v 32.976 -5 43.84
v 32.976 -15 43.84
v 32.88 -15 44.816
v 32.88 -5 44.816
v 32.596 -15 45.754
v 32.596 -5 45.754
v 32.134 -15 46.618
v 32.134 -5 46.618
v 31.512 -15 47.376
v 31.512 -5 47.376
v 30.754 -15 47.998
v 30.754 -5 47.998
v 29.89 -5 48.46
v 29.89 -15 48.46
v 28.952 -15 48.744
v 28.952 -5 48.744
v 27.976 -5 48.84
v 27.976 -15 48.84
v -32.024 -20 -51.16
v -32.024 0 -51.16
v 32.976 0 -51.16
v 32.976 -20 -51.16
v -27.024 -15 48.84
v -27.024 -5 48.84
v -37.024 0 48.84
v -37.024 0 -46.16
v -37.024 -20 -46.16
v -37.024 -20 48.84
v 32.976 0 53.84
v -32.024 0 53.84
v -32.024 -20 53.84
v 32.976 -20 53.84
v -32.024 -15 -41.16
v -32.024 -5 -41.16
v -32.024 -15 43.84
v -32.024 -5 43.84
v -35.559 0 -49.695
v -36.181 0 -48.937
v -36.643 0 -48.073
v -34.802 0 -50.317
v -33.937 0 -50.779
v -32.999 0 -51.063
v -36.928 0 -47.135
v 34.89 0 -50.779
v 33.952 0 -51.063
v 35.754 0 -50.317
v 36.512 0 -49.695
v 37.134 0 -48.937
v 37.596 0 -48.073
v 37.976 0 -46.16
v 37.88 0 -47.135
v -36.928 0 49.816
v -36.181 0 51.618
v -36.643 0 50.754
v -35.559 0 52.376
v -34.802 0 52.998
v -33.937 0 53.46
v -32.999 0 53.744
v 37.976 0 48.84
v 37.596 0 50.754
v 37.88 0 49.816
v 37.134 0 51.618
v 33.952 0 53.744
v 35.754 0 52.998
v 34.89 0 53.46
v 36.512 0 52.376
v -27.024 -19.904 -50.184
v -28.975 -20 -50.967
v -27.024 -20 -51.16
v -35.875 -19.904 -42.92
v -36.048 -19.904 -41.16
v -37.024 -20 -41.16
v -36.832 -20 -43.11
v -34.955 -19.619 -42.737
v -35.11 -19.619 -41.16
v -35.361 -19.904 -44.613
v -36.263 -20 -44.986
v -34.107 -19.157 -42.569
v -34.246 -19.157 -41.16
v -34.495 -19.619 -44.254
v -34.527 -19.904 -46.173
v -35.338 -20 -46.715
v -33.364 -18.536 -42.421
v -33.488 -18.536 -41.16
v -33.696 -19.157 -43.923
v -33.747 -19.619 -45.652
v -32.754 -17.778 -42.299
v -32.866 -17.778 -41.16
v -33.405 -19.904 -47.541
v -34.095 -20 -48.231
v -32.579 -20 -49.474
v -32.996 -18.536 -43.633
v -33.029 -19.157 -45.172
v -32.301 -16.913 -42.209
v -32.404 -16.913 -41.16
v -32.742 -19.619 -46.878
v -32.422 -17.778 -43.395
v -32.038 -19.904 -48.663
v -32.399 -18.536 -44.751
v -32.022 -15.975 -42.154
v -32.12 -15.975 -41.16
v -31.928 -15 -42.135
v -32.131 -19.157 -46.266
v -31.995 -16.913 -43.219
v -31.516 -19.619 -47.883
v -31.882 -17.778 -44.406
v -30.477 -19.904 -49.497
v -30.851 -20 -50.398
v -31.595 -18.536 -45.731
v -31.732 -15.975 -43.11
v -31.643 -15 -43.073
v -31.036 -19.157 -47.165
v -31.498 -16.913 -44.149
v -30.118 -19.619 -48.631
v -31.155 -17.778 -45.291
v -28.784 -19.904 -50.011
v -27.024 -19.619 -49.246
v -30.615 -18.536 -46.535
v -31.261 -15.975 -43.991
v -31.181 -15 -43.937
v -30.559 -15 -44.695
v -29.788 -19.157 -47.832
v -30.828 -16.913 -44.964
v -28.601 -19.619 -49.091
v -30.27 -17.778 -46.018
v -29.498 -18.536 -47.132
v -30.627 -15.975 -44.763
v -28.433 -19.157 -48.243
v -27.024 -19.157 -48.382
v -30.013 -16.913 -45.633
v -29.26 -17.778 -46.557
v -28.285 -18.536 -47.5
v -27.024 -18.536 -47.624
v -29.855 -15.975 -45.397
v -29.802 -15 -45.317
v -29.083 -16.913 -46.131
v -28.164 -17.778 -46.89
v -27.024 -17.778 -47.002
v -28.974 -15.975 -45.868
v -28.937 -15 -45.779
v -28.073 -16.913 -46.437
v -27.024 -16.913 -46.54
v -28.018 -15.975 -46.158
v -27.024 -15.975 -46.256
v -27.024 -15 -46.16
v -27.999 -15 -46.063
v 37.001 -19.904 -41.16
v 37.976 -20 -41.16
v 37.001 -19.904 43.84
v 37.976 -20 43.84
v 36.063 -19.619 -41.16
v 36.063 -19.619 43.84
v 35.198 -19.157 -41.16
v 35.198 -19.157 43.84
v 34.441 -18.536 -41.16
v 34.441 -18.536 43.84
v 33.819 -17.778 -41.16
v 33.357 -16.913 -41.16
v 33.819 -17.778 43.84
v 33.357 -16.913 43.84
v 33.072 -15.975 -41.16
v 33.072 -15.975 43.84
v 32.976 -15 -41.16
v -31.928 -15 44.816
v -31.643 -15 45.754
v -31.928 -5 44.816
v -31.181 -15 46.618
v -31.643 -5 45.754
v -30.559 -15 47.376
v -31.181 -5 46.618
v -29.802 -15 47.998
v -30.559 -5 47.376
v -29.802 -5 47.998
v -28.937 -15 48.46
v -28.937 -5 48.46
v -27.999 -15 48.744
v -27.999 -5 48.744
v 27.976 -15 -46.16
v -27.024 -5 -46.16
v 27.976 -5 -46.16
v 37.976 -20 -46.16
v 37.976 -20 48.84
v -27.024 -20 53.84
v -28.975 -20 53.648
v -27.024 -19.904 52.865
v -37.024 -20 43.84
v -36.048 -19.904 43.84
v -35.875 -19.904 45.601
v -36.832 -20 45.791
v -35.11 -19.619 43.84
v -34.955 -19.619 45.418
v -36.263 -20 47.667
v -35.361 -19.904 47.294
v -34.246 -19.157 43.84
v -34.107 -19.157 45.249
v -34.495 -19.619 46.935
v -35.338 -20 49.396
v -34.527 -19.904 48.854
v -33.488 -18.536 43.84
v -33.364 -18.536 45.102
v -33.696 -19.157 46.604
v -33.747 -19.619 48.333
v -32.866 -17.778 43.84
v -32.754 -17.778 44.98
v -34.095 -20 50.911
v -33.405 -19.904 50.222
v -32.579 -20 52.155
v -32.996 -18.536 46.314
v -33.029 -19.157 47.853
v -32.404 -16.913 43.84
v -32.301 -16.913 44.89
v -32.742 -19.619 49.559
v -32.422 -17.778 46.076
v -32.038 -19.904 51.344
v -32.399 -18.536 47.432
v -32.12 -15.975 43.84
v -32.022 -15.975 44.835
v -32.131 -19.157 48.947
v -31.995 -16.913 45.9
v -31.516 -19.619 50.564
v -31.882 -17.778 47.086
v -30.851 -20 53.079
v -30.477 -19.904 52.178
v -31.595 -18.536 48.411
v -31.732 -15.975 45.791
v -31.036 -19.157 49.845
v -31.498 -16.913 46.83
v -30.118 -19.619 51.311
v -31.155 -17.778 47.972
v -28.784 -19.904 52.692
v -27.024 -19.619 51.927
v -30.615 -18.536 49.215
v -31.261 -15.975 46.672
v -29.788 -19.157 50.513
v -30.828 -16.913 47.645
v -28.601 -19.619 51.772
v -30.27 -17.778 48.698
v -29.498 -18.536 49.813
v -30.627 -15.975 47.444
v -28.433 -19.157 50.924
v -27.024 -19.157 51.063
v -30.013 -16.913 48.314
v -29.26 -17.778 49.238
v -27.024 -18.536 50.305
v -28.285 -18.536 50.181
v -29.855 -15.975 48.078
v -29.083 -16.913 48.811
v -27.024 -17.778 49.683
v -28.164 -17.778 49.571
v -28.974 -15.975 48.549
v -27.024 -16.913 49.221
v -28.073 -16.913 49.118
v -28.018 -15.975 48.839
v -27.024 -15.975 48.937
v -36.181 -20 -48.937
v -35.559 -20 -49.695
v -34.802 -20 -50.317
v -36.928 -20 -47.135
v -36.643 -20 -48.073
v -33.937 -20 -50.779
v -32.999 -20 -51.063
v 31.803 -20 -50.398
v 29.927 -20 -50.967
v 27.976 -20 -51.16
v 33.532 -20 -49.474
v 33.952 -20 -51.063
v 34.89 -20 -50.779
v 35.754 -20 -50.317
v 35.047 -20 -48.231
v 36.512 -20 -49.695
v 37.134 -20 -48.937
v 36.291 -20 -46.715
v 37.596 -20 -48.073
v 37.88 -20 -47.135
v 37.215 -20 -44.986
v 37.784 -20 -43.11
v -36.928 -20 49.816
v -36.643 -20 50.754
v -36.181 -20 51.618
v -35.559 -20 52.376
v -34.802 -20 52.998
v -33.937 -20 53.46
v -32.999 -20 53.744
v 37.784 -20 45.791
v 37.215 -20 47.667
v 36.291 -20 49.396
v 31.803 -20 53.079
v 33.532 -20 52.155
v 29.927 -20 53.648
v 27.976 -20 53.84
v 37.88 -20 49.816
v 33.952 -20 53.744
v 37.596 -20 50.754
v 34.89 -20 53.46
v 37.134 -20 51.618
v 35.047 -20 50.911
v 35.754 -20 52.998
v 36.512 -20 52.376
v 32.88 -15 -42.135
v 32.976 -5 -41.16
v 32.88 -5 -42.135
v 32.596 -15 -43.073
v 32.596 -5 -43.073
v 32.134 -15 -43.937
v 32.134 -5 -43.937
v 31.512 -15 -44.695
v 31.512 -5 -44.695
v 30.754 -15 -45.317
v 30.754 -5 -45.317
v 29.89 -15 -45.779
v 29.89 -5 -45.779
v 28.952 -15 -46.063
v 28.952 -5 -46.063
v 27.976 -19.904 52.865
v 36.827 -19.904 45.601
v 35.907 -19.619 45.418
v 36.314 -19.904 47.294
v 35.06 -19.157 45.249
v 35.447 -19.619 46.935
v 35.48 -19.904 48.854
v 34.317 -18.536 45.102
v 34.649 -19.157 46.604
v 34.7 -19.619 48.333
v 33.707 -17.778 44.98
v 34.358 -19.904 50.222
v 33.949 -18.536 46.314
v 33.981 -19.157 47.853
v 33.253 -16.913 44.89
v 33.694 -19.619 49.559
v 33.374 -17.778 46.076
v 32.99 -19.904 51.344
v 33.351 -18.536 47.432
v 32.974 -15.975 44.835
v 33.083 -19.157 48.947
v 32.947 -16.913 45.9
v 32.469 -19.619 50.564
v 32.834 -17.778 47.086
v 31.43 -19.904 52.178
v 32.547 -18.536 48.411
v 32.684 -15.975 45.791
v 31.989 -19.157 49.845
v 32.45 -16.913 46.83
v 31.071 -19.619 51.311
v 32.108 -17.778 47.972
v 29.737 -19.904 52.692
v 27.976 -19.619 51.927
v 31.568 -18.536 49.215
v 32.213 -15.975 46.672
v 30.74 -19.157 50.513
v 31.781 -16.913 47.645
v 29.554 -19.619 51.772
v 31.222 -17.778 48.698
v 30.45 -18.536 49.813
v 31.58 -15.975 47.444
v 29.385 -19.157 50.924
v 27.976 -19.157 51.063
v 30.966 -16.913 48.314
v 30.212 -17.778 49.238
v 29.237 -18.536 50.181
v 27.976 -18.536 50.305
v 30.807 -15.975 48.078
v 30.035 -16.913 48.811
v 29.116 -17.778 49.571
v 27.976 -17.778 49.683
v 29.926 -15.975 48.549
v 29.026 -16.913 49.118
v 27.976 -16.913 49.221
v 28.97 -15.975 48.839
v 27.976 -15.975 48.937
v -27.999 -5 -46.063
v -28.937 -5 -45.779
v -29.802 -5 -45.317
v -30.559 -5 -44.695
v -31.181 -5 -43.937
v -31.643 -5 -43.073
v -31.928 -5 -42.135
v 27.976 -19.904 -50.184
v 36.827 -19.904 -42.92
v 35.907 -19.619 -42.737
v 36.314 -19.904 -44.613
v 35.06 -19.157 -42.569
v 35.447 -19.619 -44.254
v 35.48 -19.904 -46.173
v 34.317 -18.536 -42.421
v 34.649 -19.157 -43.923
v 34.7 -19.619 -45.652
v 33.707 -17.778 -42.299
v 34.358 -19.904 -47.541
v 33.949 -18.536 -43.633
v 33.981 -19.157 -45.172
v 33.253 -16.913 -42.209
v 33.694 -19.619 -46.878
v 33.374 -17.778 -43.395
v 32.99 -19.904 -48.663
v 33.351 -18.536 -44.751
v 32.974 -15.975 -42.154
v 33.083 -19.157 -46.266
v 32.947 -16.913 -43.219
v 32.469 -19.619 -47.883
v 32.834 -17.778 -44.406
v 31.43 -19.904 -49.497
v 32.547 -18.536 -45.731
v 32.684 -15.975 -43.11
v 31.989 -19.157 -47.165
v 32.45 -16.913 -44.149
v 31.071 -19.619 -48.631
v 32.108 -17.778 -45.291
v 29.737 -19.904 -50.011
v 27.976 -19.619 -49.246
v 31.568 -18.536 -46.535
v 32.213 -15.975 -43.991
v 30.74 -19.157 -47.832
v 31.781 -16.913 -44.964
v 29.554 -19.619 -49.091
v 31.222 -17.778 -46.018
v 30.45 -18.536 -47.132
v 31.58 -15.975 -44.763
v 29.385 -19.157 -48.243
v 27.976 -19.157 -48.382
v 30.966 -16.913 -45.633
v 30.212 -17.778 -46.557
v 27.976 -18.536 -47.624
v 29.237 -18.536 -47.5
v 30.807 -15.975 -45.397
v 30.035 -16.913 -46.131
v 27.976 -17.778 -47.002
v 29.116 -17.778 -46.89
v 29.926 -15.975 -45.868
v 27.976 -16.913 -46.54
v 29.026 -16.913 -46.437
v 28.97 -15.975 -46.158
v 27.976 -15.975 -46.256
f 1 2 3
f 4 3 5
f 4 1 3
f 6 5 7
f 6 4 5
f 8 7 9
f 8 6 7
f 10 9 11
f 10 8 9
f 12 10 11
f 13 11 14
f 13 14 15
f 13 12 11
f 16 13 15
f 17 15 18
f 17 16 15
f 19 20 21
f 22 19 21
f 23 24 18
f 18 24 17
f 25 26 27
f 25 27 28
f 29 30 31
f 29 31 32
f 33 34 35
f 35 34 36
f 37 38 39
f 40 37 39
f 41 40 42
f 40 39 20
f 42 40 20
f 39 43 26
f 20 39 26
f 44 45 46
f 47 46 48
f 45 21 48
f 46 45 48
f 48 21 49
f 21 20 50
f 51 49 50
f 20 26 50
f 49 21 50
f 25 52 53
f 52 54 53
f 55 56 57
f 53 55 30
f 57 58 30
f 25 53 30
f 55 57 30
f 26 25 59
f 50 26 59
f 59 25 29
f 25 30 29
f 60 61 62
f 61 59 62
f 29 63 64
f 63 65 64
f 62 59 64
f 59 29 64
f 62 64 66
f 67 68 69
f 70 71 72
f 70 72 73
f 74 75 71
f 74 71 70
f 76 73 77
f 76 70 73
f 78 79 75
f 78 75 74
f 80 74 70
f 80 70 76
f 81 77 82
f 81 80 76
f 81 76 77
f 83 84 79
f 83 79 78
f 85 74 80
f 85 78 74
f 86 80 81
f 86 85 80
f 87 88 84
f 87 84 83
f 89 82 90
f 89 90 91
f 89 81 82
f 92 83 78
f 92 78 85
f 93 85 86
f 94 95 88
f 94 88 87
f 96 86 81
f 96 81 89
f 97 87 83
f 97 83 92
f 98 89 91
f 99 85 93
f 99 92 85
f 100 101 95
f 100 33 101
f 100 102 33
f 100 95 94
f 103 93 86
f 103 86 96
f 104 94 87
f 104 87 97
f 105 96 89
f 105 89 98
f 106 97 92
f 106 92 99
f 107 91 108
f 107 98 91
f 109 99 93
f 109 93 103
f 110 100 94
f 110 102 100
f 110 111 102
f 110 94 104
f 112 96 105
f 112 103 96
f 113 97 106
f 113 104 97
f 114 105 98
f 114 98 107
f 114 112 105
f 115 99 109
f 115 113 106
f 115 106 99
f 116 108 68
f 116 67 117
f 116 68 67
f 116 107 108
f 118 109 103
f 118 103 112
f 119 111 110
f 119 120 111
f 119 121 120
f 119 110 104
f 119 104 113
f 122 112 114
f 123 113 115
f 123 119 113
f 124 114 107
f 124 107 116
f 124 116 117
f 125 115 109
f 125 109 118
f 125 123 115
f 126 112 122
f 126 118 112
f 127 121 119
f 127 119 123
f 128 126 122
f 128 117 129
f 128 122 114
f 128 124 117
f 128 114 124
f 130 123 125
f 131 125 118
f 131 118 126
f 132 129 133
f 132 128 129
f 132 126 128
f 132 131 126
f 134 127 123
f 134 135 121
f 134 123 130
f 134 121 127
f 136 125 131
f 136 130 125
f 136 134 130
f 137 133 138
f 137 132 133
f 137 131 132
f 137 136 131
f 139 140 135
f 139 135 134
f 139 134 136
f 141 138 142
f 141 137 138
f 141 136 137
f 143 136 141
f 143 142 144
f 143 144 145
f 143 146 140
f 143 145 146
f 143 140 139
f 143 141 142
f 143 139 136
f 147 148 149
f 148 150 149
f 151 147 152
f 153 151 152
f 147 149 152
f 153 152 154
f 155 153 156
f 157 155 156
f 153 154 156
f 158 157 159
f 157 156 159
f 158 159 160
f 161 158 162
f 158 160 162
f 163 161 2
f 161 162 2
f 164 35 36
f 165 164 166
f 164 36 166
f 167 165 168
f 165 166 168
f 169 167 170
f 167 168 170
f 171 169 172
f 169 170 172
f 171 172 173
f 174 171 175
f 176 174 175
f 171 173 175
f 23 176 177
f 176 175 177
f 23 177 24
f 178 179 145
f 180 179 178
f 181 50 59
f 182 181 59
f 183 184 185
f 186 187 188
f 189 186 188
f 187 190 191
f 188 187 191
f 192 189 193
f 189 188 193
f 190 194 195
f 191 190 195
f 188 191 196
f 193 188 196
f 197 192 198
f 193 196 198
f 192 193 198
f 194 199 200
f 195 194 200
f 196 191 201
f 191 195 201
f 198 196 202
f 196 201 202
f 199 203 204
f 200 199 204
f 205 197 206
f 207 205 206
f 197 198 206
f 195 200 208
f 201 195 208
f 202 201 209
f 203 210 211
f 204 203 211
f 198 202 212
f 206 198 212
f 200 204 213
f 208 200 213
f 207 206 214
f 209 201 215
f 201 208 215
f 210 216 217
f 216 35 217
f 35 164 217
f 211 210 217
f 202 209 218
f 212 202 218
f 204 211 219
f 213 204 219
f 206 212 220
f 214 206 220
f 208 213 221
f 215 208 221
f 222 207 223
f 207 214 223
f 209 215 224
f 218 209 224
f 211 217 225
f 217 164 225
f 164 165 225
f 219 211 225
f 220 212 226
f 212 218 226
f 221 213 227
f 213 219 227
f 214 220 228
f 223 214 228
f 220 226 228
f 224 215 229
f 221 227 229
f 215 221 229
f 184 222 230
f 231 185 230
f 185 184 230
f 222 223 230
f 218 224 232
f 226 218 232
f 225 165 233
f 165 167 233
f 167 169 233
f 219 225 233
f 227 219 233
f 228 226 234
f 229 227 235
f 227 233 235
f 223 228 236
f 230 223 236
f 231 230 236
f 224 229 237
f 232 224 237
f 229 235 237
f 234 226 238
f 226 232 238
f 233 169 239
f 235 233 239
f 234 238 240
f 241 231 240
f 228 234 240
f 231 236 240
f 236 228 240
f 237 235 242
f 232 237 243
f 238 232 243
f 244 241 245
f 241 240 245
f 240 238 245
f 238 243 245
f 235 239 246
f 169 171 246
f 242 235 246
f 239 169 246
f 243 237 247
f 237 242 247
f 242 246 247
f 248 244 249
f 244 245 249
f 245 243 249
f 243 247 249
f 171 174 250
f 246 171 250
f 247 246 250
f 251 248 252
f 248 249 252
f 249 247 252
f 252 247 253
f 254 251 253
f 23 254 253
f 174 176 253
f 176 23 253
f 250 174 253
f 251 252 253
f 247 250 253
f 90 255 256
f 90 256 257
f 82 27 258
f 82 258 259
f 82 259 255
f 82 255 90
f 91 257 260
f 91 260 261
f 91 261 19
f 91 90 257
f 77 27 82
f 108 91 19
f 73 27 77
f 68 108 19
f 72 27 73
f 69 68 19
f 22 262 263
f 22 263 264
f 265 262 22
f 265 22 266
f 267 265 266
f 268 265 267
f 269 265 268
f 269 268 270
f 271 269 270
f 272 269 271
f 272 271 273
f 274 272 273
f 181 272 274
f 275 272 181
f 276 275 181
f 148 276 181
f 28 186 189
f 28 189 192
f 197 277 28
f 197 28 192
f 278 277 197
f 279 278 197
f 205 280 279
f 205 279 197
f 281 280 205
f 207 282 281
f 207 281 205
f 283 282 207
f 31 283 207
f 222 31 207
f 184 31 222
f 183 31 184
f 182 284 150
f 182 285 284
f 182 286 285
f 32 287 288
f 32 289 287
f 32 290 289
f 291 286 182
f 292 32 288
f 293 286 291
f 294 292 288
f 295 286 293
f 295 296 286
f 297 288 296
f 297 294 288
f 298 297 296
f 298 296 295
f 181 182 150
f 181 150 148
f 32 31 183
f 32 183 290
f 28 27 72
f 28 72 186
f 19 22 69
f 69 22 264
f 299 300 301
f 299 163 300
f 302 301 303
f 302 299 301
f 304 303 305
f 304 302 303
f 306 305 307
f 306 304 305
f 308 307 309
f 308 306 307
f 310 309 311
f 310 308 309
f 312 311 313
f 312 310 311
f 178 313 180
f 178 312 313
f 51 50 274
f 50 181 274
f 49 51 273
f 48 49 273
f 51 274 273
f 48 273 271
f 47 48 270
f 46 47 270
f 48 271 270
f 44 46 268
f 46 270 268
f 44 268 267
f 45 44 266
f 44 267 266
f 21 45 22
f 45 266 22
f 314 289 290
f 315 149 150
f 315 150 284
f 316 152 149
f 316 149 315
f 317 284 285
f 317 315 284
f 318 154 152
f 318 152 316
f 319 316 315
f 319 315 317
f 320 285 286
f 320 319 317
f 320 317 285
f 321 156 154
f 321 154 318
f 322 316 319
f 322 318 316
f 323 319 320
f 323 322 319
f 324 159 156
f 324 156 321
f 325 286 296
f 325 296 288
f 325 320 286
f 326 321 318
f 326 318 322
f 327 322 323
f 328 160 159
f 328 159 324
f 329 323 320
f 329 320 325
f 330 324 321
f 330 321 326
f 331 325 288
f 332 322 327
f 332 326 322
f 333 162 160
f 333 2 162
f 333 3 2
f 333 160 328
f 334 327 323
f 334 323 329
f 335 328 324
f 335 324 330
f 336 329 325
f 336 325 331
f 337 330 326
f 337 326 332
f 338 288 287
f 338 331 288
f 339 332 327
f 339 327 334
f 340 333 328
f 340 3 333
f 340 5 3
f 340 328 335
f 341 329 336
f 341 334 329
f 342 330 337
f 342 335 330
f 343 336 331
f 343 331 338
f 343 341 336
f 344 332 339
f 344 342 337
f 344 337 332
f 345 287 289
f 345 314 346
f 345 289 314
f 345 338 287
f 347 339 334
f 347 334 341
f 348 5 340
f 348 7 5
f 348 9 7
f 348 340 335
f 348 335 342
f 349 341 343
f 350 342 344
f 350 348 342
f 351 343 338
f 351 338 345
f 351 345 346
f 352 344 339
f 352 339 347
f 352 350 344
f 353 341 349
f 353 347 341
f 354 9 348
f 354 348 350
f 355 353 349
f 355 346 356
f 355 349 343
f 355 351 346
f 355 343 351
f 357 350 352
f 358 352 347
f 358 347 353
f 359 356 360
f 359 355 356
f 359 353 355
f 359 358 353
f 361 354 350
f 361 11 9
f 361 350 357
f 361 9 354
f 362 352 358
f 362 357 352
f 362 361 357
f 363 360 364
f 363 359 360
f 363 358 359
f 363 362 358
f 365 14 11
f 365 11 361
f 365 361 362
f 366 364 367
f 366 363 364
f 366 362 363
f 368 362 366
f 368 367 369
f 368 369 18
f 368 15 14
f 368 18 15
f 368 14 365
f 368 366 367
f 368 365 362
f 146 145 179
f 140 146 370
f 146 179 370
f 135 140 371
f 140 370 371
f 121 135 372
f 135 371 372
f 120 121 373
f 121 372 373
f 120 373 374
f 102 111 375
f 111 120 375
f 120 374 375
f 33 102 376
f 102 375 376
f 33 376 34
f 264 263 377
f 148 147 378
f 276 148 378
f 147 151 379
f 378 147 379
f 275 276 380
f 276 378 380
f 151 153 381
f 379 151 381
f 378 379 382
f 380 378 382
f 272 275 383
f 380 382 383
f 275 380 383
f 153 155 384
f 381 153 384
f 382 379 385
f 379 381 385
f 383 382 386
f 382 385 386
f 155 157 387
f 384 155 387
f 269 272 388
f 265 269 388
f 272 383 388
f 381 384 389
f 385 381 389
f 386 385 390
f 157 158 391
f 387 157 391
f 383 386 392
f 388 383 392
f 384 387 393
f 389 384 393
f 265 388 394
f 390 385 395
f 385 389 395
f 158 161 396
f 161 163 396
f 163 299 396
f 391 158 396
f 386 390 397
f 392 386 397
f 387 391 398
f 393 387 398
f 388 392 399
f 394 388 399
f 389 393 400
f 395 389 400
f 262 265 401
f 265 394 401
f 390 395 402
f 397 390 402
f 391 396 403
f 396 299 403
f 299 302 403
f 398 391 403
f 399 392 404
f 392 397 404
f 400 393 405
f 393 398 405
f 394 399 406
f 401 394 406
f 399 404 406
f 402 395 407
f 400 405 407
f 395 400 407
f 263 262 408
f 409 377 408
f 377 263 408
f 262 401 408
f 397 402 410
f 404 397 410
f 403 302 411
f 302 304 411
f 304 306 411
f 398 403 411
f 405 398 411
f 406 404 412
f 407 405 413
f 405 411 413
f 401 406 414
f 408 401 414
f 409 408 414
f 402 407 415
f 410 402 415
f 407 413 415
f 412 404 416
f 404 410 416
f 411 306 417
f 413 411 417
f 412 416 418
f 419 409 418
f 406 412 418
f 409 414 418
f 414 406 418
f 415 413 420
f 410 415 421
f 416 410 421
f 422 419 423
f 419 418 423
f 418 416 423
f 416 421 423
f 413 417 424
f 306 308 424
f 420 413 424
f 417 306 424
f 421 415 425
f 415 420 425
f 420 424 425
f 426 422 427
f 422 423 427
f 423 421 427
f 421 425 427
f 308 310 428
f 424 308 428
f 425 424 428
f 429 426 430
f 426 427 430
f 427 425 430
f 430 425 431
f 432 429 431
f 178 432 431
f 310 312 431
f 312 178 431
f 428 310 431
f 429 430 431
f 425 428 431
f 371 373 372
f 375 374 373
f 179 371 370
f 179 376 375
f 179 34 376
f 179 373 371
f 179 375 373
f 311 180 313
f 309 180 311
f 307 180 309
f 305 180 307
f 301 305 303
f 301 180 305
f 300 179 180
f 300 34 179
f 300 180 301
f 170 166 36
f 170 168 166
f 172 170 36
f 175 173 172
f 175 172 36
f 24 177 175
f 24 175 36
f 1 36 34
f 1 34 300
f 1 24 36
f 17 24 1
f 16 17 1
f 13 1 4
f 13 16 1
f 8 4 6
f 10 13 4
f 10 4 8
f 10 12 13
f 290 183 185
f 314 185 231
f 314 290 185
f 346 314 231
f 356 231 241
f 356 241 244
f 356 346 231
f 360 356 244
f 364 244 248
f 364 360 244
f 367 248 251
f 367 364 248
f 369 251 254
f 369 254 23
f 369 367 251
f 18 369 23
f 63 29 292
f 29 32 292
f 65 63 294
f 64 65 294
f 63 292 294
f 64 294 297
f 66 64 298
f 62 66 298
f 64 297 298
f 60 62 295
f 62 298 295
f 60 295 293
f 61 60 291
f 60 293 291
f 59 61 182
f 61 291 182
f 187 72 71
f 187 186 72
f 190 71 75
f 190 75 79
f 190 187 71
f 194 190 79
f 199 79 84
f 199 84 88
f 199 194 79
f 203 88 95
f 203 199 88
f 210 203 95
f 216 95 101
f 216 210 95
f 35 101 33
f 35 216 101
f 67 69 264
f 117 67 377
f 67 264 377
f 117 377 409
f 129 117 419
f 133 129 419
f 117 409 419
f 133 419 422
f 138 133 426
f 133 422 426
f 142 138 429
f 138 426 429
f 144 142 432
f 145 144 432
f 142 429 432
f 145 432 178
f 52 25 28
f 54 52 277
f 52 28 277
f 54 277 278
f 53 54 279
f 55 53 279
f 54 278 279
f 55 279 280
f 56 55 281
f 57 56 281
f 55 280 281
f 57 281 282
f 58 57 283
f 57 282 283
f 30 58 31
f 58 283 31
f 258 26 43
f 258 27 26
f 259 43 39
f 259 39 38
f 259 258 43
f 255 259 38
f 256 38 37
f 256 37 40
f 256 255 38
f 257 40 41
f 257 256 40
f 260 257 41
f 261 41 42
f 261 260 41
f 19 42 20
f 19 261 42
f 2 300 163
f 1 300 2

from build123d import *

# Parameters (mm, degrees)
F0_W     = 75
F0_H     = 105
F1_DEPTH = 20
F2_T     = -5
F3_R     = 5
F3_R_2   = 4.99999


# Not quite as in the source:
# - a fillet or chamfer is up to 0.001 mm smaller than in the source, because OpenCascade refuses the exact size


with BuildPart() as f1:
    # F0 (on Front) → F1 (new body)
    with BuildSketch(Plane.XZ):
        with Locations((0.4762494937, 1.3404280991)):
            Rectangle(F0_W, F0_H)
    extrude(amount=F1_DEPTH)

    # F2
    f2_openings = [f1.faces().sort_by_distance(p)[0] for p in [
        (0.476249, -20, 1.340428),
    ]]
    offset(amount=F2_T, openings=f2_openings)

    # F3 (call 1 of 5: OpenCascade refuses the feature's edges together)
    f3_edges = [f1.edges().sort_by_distance(p)[0] for p in [
        (-37.023751, -10, 53.840428),
    ]]
    fillet(f3_edges, radius=F3_R)

    # F3#2 (call 2 of 5)
    f3_2_edges = [f1.edges().sort_by_distance(p)[0] for p in [
        (-37.023751, -10, -51.159572),
    ]]
    fillet(f3_2_edges, radius=F3_R)

    # F3#3 (call 3 of 5)
    f3_3_edges = [f1.edges().sort_by_distance(p)[0] for p in [
        (37.976249, -10, 53.840428),
    ]]
    fillet(f3_3_edges, radius=F3_R)

    # F3#4 (call 4 of 5)
    f3_4_edges = [f1.edges().sort_by_distance(p)[0] for p in [
        (37.976249, -10, -51.159572),
    ]]
    fillet(f3_4_edges, radius=F3_R)

    # F3#5 (call 5 of 5) (radius 5 in the source; OpenCascade refuses exactly that, so slightly less here)
    f3_5_edges = [f1.edges().sort_by_distance(p)[0] for p in [
        (-32.023751, -12.5, 48.840428),
        (32.976249, -12.5, 48.840428),
        (-32.023751, -12.5, -46.159572),
        (32.976249, -12.5, -46.159572),
        (32.976249, -20, 1.340428),
        (-32.023751, -20, 1.340428),
        (0.476249, -20, 48.840428),
        (0.476249, -20, -46.159572),
    ]]
    fillet(f3_5_edges, radius=F3_R_2)


solid = f1.part
